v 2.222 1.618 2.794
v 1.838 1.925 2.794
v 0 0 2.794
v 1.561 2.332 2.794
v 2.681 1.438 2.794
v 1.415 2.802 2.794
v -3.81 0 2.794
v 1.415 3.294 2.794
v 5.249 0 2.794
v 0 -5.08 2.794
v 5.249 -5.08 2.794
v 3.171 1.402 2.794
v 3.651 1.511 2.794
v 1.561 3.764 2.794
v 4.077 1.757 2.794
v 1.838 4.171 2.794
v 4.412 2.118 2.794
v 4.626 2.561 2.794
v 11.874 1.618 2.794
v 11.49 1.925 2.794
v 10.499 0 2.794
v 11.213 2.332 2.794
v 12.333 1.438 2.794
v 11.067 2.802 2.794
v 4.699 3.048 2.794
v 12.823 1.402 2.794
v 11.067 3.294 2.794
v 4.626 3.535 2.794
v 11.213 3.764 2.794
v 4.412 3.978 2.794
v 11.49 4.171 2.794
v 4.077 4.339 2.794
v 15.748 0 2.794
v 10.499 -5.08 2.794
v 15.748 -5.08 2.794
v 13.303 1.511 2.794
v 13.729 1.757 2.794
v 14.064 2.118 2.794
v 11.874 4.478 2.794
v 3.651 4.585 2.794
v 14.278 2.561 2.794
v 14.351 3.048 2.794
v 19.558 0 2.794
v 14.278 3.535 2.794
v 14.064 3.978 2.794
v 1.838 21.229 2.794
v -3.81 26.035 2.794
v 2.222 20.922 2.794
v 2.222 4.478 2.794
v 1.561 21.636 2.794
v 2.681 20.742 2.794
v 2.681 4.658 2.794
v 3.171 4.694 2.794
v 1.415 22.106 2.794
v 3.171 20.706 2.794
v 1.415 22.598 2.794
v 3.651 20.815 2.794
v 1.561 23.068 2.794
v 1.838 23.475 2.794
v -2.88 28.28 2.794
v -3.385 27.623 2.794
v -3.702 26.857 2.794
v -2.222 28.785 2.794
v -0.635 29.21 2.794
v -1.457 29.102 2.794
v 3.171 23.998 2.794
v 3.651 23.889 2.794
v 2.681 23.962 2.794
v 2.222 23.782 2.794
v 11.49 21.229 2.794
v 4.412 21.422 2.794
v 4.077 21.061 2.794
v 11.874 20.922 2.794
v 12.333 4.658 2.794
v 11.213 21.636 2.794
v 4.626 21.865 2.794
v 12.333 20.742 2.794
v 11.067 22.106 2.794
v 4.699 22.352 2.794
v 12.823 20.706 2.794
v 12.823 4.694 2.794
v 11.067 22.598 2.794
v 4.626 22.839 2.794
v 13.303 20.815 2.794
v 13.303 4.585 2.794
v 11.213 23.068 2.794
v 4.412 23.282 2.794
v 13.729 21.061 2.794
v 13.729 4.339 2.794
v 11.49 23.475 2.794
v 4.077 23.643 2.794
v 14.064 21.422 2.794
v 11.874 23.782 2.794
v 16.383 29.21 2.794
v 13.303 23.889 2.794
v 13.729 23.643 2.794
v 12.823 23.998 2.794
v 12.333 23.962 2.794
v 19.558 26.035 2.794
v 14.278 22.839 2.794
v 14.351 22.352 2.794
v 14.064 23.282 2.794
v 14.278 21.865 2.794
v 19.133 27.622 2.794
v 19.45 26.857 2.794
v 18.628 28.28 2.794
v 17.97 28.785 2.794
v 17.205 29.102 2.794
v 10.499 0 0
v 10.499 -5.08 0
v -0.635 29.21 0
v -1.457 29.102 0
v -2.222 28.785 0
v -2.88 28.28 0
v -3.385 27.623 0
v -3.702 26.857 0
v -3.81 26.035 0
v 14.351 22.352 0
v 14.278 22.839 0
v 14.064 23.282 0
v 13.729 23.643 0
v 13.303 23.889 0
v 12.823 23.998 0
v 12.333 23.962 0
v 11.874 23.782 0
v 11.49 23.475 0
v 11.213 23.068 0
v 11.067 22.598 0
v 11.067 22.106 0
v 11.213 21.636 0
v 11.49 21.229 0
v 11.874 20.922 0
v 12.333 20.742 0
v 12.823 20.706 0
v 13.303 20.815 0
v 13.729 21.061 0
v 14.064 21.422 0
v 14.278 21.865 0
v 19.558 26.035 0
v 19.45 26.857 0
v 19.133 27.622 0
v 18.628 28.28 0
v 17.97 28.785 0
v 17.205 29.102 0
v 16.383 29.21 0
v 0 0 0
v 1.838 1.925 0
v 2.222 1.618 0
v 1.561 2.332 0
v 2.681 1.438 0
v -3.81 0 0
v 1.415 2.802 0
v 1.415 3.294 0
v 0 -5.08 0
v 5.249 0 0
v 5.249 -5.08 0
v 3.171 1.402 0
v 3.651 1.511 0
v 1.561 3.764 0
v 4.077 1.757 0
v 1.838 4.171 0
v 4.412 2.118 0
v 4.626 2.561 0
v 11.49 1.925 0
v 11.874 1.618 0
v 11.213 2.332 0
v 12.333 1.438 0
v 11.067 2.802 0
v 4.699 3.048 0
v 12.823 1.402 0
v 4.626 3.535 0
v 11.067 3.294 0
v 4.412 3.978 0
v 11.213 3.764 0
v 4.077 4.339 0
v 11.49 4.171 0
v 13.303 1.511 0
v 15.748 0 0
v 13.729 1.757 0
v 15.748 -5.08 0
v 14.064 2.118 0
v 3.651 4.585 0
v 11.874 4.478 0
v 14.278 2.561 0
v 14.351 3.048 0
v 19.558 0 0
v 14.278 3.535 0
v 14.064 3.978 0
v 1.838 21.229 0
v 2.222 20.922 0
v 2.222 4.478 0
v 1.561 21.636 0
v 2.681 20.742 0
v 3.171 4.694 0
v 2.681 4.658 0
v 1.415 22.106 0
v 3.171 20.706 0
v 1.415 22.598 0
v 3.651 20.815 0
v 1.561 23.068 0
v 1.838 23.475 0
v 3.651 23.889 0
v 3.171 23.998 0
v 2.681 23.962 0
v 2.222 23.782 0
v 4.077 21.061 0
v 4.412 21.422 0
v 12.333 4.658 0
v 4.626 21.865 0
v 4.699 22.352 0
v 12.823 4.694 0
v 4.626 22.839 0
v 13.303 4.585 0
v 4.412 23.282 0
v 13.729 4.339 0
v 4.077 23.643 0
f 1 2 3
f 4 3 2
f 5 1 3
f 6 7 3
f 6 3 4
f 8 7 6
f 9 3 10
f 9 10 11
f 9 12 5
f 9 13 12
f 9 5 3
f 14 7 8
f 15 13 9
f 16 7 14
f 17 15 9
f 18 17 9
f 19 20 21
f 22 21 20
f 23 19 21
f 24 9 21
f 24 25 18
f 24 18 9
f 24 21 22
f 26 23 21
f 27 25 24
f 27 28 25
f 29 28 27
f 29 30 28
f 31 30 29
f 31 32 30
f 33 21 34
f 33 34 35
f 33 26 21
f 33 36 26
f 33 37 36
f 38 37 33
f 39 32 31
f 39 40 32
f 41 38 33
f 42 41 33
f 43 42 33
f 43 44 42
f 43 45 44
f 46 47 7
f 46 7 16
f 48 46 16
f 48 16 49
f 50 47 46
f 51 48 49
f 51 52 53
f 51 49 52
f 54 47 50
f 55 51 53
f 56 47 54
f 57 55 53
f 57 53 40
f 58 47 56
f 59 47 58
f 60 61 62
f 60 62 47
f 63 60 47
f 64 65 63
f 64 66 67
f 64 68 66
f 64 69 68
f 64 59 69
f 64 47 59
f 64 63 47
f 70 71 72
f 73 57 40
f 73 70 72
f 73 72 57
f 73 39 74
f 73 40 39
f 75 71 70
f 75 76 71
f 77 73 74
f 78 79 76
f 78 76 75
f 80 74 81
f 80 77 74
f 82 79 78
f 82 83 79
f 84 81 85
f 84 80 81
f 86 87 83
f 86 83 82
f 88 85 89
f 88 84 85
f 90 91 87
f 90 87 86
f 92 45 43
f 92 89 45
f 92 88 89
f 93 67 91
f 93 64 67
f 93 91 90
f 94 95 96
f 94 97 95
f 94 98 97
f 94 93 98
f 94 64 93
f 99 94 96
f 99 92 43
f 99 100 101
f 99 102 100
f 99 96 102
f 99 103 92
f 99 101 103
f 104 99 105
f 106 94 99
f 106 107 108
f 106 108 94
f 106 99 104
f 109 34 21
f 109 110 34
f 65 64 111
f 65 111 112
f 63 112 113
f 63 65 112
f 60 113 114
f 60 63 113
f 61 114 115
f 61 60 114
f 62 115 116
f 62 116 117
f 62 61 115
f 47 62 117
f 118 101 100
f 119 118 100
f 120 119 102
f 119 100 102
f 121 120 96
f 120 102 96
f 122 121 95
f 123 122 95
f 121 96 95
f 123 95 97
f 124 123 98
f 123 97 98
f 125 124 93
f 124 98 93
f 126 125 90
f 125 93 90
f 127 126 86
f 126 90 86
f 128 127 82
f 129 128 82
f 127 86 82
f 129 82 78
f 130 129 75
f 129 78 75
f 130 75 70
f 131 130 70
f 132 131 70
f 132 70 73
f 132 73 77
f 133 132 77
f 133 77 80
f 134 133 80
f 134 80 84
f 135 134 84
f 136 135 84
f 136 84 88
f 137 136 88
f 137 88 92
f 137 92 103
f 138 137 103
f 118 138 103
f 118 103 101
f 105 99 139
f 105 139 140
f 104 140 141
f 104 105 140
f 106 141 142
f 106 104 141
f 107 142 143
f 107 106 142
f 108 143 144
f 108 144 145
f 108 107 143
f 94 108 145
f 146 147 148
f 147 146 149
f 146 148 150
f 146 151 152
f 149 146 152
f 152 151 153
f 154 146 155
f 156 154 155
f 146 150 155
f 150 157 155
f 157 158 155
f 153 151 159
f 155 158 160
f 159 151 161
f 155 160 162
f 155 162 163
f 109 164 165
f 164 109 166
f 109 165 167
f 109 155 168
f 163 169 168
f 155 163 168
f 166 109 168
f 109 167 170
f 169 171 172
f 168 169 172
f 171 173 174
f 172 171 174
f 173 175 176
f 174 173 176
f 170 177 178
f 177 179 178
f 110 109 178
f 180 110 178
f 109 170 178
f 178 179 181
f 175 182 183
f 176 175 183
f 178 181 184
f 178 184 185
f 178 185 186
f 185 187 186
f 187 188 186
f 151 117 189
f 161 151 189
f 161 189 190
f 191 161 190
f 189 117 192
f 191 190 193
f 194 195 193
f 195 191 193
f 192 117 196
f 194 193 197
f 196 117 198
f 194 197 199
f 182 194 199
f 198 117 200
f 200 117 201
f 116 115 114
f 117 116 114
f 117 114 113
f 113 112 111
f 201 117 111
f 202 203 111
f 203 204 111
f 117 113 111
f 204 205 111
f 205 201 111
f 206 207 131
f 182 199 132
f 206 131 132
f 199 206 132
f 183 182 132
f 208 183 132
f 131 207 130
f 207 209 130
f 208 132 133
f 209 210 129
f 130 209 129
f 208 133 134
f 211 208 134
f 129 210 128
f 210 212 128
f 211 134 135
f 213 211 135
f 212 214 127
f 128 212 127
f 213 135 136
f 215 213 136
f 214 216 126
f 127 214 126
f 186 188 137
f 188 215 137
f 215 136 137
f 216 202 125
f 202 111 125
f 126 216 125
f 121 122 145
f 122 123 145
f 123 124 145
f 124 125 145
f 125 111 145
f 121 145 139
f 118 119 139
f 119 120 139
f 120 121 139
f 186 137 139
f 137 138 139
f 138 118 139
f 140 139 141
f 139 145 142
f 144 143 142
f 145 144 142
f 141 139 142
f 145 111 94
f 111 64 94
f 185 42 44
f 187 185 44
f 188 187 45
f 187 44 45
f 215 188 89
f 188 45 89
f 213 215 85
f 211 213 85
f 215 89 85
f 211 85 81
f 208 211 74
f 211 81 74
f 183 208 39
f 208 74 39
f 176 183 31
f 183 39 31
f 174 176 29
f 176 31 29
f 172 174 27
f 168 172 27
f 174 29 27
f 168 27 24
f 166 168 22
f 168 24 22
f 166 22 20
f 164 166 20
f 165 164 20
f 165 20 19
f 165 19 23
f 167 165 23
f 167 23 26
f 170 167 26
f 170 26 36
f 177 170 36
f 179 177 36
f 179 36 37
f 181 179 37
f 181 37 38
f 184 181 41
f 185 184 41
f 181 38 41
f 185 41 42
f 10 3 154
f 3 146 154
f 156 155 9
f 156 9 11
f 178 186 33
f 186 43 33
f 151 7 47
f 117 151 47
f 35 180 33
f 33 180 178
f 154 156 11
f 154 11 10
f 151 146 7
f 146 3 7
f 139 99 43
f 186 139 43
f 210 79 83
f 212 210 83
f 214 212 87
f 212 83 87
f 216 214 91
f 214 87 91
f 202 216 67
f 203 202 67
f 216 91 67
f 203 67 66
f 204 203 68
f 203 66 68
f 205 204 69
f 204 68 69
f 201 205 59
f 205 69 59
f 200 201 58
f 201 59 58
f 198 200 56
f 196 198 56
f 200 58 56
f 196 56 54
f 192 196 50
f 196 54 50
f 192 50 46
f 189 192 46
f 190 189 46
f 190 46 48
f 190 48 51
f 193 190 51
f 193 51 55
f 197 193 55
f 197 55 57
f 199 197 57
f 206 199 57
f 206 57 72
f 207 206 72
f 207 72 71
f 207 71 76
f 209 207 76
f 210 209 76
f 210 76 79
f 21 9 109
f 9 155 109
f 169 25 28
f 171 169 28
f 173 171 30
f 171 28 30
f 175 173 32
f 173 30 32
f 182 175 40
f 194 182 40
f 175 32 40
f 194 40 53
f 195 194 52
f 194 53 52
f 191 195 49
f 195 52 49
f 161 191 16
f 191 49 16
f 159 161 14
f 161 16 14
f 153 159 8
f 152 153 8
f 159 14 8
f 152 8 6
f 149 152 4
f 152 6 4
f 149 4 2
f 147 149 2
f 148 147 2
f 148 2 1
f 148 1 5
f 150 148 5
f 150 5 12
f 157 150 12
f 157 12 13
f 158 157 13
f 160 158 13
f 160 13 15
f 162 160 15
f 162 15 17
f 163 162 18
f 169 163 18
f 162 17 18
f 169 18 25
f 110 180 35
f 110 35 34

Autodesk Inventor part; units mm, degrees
ref_plane "YZ Plane" through (0, 0, 0) normal (1, 0, 0) x (0, 1, 0)
ref_plane "XZ Plane" through (0, 0, 0) normal (0, 1, 0) x (-1, 0, 0)
ref_plane "XY Plane" through (0, 0, 0) normal (0, 0, 1) x (1, 0, 0)
sketch "Sketch1" plane through (0, 0, 0) normal (0, 0, 1) x (1, 0, 0)
  line L0 (0, 0) -> (15.748, 0)
  line L1 (15.748, 0) -> (15.748, 25.4)
  line L2 (15.748, 25.4) -> (0, 25.4)
  line L3 (0, 25.4) -> (0, 0)
  line L4 (0, 0) -> (5.2493, 0)
  line L5 (5.2493, 0) -> (5.2493, -5.08)
  line L6 (5.2493, -5.08) -> (0, -5.08)
  line L7 (0, -5.08) -> (0, 0)
  line L8 (10.4987, 0) -> (15.748, 0)
  line L9 (15.748, 0) -> (15.748, -5.08)
  line L10 (15.748, -5.08) -> (10.4987, -5.08)
  line L11 (10.4987, -5.08) -> (10.4987, 0)
  dimension "d0" = 25.4
  dimension "d1" = 15.748
  dimension "d2" = 5.2493
  dimension "d3" = 5.08
  dimension "d4" = 0
  dimension "d5" = 5.2493
extrude "Extrusion1" add sketch "Sketch1" along normal blind 2.794
sketch "Sketch2" plane through (0, 0, 2.794) normal (0, 0, 1) x (1, 0, 0)
  circle A0 centre (3.048, 22.352) radius 1.651 projected
  circle A1 centre (12.7, 3.048) radius 1.651 projected
  line L0 (10.4987, 0) -> (10.4987, -5.08) projected
  line L1 (10.4987, -5.08) -> (15.748, -5.08) projected
  line L2 (15.748, -5.08) -> (15.748, 25.4) projected
  line L3 (15.748, 25.4) -> (0, 25.4) projected
  line L4 (0, 25.4) -> (0, -5.08) projected
  line L5 (0, -5.08) -> (5.2493, -5.08) projected
  line L6 (5.2493, -5.08) -> (5.2493, 0) projected
  line L7 (5.2493, 0) -> (10.4987, 0) projected
  line L8 (5.2493, 0) -> (10.4987, 0) construction
  line L9 (7.874, 0) -> (7.874, 25.4) construction
  line L10 (7.874, 12.7) -> (15.748, 12.7) construction
  circle A2 centre (12.7, 22.352) radius 1.651
  circle A3 centre (3.048, 3.048) radius 1.651
  point P0 (0, 0)
extrude "Extrusion2" cut sketch "Sketch2" against normal blind 25.4 contours A0 | A1 | A2 | A3
sketch "Sketch3" plane through (0, 0, 2.794) normal (0, 0, 1) x (1, 0, 0)
  circle A0 centre (12.7, 22.352) radius 1.651 projected
  circle A1 centre (3.048, 22.352) radius 1.651 projected
  circle A2 centre (12.7, 3.048) radius 1.651 projected
  circle A3 centre (3.048, 3.048) radius 1.651 projected
  line L0 (10.4987, 0) -> (10.4987, -5.08) projected
  line L1 (10.4987, -5.08) -> (15.748, -5.08) projected
  line L2 (15.748, -5.08) -> (15.748, 25.4) projected
  line L3 (15.748, 25.4) -> (0, 25.4) projected
  line L4 (0, 25.4) -> (0, -5.08) projected
  line L5 (0, -5.08) -> (5.2493, -5.08) projected
  line L6 (5.2493, -5.08) -> (5.2493, 0) projected
  line L7 (5.2493, 0) -> (10.4987, 0) projected
  line L8 (0, 0) -> (-3.81, 0)
  line L9 (-3.81, 0) -> (-3.81, 26.035)
  line L10 (-0.635, 29.21) -> (16.383, 29.21)
  line L11 (19.558, 26.035) -> (19.558, 0)
  line L12 (19.558, 0) -> (15.748, 0)
  arc A4 (-0.635, 29.21) -> (-3.81, 26.035) centre (-0.635, 26.035) ccw
  arc A5 (19.558, 26.035) -> (16.383, 29.21) centre (16.383, 26.035) ccw
  line L13 (0, 0) -> (0, 25.4)
  line L14 (15.748, 25.4) -> (0, 25.4) projected
  line L15 (0, 25.4) -> (15.748, 25.4)
  line L16 (15.748, 25.4) -> (15.748, 0)
  dimension "d10" = 3.81
  dimension "d11" = 3.81
  dimension "d12" = 3.81
  dimension "d13" = 3.175
extrude "Extrusion3" add sketch "Sketch3" against normal blind 2.794 contours L2 L3 L4 L8 L9 A4 L10 A5 L11 L12
equation "\"d2\" = 0.333333 * d1"
equation "\"d5\" = d2"
equation "\"d11\" = d10"
equation "\"d12\" = d11"
properties part number "LimitSwitchMount" material "Polycarbonate, Smoke"
